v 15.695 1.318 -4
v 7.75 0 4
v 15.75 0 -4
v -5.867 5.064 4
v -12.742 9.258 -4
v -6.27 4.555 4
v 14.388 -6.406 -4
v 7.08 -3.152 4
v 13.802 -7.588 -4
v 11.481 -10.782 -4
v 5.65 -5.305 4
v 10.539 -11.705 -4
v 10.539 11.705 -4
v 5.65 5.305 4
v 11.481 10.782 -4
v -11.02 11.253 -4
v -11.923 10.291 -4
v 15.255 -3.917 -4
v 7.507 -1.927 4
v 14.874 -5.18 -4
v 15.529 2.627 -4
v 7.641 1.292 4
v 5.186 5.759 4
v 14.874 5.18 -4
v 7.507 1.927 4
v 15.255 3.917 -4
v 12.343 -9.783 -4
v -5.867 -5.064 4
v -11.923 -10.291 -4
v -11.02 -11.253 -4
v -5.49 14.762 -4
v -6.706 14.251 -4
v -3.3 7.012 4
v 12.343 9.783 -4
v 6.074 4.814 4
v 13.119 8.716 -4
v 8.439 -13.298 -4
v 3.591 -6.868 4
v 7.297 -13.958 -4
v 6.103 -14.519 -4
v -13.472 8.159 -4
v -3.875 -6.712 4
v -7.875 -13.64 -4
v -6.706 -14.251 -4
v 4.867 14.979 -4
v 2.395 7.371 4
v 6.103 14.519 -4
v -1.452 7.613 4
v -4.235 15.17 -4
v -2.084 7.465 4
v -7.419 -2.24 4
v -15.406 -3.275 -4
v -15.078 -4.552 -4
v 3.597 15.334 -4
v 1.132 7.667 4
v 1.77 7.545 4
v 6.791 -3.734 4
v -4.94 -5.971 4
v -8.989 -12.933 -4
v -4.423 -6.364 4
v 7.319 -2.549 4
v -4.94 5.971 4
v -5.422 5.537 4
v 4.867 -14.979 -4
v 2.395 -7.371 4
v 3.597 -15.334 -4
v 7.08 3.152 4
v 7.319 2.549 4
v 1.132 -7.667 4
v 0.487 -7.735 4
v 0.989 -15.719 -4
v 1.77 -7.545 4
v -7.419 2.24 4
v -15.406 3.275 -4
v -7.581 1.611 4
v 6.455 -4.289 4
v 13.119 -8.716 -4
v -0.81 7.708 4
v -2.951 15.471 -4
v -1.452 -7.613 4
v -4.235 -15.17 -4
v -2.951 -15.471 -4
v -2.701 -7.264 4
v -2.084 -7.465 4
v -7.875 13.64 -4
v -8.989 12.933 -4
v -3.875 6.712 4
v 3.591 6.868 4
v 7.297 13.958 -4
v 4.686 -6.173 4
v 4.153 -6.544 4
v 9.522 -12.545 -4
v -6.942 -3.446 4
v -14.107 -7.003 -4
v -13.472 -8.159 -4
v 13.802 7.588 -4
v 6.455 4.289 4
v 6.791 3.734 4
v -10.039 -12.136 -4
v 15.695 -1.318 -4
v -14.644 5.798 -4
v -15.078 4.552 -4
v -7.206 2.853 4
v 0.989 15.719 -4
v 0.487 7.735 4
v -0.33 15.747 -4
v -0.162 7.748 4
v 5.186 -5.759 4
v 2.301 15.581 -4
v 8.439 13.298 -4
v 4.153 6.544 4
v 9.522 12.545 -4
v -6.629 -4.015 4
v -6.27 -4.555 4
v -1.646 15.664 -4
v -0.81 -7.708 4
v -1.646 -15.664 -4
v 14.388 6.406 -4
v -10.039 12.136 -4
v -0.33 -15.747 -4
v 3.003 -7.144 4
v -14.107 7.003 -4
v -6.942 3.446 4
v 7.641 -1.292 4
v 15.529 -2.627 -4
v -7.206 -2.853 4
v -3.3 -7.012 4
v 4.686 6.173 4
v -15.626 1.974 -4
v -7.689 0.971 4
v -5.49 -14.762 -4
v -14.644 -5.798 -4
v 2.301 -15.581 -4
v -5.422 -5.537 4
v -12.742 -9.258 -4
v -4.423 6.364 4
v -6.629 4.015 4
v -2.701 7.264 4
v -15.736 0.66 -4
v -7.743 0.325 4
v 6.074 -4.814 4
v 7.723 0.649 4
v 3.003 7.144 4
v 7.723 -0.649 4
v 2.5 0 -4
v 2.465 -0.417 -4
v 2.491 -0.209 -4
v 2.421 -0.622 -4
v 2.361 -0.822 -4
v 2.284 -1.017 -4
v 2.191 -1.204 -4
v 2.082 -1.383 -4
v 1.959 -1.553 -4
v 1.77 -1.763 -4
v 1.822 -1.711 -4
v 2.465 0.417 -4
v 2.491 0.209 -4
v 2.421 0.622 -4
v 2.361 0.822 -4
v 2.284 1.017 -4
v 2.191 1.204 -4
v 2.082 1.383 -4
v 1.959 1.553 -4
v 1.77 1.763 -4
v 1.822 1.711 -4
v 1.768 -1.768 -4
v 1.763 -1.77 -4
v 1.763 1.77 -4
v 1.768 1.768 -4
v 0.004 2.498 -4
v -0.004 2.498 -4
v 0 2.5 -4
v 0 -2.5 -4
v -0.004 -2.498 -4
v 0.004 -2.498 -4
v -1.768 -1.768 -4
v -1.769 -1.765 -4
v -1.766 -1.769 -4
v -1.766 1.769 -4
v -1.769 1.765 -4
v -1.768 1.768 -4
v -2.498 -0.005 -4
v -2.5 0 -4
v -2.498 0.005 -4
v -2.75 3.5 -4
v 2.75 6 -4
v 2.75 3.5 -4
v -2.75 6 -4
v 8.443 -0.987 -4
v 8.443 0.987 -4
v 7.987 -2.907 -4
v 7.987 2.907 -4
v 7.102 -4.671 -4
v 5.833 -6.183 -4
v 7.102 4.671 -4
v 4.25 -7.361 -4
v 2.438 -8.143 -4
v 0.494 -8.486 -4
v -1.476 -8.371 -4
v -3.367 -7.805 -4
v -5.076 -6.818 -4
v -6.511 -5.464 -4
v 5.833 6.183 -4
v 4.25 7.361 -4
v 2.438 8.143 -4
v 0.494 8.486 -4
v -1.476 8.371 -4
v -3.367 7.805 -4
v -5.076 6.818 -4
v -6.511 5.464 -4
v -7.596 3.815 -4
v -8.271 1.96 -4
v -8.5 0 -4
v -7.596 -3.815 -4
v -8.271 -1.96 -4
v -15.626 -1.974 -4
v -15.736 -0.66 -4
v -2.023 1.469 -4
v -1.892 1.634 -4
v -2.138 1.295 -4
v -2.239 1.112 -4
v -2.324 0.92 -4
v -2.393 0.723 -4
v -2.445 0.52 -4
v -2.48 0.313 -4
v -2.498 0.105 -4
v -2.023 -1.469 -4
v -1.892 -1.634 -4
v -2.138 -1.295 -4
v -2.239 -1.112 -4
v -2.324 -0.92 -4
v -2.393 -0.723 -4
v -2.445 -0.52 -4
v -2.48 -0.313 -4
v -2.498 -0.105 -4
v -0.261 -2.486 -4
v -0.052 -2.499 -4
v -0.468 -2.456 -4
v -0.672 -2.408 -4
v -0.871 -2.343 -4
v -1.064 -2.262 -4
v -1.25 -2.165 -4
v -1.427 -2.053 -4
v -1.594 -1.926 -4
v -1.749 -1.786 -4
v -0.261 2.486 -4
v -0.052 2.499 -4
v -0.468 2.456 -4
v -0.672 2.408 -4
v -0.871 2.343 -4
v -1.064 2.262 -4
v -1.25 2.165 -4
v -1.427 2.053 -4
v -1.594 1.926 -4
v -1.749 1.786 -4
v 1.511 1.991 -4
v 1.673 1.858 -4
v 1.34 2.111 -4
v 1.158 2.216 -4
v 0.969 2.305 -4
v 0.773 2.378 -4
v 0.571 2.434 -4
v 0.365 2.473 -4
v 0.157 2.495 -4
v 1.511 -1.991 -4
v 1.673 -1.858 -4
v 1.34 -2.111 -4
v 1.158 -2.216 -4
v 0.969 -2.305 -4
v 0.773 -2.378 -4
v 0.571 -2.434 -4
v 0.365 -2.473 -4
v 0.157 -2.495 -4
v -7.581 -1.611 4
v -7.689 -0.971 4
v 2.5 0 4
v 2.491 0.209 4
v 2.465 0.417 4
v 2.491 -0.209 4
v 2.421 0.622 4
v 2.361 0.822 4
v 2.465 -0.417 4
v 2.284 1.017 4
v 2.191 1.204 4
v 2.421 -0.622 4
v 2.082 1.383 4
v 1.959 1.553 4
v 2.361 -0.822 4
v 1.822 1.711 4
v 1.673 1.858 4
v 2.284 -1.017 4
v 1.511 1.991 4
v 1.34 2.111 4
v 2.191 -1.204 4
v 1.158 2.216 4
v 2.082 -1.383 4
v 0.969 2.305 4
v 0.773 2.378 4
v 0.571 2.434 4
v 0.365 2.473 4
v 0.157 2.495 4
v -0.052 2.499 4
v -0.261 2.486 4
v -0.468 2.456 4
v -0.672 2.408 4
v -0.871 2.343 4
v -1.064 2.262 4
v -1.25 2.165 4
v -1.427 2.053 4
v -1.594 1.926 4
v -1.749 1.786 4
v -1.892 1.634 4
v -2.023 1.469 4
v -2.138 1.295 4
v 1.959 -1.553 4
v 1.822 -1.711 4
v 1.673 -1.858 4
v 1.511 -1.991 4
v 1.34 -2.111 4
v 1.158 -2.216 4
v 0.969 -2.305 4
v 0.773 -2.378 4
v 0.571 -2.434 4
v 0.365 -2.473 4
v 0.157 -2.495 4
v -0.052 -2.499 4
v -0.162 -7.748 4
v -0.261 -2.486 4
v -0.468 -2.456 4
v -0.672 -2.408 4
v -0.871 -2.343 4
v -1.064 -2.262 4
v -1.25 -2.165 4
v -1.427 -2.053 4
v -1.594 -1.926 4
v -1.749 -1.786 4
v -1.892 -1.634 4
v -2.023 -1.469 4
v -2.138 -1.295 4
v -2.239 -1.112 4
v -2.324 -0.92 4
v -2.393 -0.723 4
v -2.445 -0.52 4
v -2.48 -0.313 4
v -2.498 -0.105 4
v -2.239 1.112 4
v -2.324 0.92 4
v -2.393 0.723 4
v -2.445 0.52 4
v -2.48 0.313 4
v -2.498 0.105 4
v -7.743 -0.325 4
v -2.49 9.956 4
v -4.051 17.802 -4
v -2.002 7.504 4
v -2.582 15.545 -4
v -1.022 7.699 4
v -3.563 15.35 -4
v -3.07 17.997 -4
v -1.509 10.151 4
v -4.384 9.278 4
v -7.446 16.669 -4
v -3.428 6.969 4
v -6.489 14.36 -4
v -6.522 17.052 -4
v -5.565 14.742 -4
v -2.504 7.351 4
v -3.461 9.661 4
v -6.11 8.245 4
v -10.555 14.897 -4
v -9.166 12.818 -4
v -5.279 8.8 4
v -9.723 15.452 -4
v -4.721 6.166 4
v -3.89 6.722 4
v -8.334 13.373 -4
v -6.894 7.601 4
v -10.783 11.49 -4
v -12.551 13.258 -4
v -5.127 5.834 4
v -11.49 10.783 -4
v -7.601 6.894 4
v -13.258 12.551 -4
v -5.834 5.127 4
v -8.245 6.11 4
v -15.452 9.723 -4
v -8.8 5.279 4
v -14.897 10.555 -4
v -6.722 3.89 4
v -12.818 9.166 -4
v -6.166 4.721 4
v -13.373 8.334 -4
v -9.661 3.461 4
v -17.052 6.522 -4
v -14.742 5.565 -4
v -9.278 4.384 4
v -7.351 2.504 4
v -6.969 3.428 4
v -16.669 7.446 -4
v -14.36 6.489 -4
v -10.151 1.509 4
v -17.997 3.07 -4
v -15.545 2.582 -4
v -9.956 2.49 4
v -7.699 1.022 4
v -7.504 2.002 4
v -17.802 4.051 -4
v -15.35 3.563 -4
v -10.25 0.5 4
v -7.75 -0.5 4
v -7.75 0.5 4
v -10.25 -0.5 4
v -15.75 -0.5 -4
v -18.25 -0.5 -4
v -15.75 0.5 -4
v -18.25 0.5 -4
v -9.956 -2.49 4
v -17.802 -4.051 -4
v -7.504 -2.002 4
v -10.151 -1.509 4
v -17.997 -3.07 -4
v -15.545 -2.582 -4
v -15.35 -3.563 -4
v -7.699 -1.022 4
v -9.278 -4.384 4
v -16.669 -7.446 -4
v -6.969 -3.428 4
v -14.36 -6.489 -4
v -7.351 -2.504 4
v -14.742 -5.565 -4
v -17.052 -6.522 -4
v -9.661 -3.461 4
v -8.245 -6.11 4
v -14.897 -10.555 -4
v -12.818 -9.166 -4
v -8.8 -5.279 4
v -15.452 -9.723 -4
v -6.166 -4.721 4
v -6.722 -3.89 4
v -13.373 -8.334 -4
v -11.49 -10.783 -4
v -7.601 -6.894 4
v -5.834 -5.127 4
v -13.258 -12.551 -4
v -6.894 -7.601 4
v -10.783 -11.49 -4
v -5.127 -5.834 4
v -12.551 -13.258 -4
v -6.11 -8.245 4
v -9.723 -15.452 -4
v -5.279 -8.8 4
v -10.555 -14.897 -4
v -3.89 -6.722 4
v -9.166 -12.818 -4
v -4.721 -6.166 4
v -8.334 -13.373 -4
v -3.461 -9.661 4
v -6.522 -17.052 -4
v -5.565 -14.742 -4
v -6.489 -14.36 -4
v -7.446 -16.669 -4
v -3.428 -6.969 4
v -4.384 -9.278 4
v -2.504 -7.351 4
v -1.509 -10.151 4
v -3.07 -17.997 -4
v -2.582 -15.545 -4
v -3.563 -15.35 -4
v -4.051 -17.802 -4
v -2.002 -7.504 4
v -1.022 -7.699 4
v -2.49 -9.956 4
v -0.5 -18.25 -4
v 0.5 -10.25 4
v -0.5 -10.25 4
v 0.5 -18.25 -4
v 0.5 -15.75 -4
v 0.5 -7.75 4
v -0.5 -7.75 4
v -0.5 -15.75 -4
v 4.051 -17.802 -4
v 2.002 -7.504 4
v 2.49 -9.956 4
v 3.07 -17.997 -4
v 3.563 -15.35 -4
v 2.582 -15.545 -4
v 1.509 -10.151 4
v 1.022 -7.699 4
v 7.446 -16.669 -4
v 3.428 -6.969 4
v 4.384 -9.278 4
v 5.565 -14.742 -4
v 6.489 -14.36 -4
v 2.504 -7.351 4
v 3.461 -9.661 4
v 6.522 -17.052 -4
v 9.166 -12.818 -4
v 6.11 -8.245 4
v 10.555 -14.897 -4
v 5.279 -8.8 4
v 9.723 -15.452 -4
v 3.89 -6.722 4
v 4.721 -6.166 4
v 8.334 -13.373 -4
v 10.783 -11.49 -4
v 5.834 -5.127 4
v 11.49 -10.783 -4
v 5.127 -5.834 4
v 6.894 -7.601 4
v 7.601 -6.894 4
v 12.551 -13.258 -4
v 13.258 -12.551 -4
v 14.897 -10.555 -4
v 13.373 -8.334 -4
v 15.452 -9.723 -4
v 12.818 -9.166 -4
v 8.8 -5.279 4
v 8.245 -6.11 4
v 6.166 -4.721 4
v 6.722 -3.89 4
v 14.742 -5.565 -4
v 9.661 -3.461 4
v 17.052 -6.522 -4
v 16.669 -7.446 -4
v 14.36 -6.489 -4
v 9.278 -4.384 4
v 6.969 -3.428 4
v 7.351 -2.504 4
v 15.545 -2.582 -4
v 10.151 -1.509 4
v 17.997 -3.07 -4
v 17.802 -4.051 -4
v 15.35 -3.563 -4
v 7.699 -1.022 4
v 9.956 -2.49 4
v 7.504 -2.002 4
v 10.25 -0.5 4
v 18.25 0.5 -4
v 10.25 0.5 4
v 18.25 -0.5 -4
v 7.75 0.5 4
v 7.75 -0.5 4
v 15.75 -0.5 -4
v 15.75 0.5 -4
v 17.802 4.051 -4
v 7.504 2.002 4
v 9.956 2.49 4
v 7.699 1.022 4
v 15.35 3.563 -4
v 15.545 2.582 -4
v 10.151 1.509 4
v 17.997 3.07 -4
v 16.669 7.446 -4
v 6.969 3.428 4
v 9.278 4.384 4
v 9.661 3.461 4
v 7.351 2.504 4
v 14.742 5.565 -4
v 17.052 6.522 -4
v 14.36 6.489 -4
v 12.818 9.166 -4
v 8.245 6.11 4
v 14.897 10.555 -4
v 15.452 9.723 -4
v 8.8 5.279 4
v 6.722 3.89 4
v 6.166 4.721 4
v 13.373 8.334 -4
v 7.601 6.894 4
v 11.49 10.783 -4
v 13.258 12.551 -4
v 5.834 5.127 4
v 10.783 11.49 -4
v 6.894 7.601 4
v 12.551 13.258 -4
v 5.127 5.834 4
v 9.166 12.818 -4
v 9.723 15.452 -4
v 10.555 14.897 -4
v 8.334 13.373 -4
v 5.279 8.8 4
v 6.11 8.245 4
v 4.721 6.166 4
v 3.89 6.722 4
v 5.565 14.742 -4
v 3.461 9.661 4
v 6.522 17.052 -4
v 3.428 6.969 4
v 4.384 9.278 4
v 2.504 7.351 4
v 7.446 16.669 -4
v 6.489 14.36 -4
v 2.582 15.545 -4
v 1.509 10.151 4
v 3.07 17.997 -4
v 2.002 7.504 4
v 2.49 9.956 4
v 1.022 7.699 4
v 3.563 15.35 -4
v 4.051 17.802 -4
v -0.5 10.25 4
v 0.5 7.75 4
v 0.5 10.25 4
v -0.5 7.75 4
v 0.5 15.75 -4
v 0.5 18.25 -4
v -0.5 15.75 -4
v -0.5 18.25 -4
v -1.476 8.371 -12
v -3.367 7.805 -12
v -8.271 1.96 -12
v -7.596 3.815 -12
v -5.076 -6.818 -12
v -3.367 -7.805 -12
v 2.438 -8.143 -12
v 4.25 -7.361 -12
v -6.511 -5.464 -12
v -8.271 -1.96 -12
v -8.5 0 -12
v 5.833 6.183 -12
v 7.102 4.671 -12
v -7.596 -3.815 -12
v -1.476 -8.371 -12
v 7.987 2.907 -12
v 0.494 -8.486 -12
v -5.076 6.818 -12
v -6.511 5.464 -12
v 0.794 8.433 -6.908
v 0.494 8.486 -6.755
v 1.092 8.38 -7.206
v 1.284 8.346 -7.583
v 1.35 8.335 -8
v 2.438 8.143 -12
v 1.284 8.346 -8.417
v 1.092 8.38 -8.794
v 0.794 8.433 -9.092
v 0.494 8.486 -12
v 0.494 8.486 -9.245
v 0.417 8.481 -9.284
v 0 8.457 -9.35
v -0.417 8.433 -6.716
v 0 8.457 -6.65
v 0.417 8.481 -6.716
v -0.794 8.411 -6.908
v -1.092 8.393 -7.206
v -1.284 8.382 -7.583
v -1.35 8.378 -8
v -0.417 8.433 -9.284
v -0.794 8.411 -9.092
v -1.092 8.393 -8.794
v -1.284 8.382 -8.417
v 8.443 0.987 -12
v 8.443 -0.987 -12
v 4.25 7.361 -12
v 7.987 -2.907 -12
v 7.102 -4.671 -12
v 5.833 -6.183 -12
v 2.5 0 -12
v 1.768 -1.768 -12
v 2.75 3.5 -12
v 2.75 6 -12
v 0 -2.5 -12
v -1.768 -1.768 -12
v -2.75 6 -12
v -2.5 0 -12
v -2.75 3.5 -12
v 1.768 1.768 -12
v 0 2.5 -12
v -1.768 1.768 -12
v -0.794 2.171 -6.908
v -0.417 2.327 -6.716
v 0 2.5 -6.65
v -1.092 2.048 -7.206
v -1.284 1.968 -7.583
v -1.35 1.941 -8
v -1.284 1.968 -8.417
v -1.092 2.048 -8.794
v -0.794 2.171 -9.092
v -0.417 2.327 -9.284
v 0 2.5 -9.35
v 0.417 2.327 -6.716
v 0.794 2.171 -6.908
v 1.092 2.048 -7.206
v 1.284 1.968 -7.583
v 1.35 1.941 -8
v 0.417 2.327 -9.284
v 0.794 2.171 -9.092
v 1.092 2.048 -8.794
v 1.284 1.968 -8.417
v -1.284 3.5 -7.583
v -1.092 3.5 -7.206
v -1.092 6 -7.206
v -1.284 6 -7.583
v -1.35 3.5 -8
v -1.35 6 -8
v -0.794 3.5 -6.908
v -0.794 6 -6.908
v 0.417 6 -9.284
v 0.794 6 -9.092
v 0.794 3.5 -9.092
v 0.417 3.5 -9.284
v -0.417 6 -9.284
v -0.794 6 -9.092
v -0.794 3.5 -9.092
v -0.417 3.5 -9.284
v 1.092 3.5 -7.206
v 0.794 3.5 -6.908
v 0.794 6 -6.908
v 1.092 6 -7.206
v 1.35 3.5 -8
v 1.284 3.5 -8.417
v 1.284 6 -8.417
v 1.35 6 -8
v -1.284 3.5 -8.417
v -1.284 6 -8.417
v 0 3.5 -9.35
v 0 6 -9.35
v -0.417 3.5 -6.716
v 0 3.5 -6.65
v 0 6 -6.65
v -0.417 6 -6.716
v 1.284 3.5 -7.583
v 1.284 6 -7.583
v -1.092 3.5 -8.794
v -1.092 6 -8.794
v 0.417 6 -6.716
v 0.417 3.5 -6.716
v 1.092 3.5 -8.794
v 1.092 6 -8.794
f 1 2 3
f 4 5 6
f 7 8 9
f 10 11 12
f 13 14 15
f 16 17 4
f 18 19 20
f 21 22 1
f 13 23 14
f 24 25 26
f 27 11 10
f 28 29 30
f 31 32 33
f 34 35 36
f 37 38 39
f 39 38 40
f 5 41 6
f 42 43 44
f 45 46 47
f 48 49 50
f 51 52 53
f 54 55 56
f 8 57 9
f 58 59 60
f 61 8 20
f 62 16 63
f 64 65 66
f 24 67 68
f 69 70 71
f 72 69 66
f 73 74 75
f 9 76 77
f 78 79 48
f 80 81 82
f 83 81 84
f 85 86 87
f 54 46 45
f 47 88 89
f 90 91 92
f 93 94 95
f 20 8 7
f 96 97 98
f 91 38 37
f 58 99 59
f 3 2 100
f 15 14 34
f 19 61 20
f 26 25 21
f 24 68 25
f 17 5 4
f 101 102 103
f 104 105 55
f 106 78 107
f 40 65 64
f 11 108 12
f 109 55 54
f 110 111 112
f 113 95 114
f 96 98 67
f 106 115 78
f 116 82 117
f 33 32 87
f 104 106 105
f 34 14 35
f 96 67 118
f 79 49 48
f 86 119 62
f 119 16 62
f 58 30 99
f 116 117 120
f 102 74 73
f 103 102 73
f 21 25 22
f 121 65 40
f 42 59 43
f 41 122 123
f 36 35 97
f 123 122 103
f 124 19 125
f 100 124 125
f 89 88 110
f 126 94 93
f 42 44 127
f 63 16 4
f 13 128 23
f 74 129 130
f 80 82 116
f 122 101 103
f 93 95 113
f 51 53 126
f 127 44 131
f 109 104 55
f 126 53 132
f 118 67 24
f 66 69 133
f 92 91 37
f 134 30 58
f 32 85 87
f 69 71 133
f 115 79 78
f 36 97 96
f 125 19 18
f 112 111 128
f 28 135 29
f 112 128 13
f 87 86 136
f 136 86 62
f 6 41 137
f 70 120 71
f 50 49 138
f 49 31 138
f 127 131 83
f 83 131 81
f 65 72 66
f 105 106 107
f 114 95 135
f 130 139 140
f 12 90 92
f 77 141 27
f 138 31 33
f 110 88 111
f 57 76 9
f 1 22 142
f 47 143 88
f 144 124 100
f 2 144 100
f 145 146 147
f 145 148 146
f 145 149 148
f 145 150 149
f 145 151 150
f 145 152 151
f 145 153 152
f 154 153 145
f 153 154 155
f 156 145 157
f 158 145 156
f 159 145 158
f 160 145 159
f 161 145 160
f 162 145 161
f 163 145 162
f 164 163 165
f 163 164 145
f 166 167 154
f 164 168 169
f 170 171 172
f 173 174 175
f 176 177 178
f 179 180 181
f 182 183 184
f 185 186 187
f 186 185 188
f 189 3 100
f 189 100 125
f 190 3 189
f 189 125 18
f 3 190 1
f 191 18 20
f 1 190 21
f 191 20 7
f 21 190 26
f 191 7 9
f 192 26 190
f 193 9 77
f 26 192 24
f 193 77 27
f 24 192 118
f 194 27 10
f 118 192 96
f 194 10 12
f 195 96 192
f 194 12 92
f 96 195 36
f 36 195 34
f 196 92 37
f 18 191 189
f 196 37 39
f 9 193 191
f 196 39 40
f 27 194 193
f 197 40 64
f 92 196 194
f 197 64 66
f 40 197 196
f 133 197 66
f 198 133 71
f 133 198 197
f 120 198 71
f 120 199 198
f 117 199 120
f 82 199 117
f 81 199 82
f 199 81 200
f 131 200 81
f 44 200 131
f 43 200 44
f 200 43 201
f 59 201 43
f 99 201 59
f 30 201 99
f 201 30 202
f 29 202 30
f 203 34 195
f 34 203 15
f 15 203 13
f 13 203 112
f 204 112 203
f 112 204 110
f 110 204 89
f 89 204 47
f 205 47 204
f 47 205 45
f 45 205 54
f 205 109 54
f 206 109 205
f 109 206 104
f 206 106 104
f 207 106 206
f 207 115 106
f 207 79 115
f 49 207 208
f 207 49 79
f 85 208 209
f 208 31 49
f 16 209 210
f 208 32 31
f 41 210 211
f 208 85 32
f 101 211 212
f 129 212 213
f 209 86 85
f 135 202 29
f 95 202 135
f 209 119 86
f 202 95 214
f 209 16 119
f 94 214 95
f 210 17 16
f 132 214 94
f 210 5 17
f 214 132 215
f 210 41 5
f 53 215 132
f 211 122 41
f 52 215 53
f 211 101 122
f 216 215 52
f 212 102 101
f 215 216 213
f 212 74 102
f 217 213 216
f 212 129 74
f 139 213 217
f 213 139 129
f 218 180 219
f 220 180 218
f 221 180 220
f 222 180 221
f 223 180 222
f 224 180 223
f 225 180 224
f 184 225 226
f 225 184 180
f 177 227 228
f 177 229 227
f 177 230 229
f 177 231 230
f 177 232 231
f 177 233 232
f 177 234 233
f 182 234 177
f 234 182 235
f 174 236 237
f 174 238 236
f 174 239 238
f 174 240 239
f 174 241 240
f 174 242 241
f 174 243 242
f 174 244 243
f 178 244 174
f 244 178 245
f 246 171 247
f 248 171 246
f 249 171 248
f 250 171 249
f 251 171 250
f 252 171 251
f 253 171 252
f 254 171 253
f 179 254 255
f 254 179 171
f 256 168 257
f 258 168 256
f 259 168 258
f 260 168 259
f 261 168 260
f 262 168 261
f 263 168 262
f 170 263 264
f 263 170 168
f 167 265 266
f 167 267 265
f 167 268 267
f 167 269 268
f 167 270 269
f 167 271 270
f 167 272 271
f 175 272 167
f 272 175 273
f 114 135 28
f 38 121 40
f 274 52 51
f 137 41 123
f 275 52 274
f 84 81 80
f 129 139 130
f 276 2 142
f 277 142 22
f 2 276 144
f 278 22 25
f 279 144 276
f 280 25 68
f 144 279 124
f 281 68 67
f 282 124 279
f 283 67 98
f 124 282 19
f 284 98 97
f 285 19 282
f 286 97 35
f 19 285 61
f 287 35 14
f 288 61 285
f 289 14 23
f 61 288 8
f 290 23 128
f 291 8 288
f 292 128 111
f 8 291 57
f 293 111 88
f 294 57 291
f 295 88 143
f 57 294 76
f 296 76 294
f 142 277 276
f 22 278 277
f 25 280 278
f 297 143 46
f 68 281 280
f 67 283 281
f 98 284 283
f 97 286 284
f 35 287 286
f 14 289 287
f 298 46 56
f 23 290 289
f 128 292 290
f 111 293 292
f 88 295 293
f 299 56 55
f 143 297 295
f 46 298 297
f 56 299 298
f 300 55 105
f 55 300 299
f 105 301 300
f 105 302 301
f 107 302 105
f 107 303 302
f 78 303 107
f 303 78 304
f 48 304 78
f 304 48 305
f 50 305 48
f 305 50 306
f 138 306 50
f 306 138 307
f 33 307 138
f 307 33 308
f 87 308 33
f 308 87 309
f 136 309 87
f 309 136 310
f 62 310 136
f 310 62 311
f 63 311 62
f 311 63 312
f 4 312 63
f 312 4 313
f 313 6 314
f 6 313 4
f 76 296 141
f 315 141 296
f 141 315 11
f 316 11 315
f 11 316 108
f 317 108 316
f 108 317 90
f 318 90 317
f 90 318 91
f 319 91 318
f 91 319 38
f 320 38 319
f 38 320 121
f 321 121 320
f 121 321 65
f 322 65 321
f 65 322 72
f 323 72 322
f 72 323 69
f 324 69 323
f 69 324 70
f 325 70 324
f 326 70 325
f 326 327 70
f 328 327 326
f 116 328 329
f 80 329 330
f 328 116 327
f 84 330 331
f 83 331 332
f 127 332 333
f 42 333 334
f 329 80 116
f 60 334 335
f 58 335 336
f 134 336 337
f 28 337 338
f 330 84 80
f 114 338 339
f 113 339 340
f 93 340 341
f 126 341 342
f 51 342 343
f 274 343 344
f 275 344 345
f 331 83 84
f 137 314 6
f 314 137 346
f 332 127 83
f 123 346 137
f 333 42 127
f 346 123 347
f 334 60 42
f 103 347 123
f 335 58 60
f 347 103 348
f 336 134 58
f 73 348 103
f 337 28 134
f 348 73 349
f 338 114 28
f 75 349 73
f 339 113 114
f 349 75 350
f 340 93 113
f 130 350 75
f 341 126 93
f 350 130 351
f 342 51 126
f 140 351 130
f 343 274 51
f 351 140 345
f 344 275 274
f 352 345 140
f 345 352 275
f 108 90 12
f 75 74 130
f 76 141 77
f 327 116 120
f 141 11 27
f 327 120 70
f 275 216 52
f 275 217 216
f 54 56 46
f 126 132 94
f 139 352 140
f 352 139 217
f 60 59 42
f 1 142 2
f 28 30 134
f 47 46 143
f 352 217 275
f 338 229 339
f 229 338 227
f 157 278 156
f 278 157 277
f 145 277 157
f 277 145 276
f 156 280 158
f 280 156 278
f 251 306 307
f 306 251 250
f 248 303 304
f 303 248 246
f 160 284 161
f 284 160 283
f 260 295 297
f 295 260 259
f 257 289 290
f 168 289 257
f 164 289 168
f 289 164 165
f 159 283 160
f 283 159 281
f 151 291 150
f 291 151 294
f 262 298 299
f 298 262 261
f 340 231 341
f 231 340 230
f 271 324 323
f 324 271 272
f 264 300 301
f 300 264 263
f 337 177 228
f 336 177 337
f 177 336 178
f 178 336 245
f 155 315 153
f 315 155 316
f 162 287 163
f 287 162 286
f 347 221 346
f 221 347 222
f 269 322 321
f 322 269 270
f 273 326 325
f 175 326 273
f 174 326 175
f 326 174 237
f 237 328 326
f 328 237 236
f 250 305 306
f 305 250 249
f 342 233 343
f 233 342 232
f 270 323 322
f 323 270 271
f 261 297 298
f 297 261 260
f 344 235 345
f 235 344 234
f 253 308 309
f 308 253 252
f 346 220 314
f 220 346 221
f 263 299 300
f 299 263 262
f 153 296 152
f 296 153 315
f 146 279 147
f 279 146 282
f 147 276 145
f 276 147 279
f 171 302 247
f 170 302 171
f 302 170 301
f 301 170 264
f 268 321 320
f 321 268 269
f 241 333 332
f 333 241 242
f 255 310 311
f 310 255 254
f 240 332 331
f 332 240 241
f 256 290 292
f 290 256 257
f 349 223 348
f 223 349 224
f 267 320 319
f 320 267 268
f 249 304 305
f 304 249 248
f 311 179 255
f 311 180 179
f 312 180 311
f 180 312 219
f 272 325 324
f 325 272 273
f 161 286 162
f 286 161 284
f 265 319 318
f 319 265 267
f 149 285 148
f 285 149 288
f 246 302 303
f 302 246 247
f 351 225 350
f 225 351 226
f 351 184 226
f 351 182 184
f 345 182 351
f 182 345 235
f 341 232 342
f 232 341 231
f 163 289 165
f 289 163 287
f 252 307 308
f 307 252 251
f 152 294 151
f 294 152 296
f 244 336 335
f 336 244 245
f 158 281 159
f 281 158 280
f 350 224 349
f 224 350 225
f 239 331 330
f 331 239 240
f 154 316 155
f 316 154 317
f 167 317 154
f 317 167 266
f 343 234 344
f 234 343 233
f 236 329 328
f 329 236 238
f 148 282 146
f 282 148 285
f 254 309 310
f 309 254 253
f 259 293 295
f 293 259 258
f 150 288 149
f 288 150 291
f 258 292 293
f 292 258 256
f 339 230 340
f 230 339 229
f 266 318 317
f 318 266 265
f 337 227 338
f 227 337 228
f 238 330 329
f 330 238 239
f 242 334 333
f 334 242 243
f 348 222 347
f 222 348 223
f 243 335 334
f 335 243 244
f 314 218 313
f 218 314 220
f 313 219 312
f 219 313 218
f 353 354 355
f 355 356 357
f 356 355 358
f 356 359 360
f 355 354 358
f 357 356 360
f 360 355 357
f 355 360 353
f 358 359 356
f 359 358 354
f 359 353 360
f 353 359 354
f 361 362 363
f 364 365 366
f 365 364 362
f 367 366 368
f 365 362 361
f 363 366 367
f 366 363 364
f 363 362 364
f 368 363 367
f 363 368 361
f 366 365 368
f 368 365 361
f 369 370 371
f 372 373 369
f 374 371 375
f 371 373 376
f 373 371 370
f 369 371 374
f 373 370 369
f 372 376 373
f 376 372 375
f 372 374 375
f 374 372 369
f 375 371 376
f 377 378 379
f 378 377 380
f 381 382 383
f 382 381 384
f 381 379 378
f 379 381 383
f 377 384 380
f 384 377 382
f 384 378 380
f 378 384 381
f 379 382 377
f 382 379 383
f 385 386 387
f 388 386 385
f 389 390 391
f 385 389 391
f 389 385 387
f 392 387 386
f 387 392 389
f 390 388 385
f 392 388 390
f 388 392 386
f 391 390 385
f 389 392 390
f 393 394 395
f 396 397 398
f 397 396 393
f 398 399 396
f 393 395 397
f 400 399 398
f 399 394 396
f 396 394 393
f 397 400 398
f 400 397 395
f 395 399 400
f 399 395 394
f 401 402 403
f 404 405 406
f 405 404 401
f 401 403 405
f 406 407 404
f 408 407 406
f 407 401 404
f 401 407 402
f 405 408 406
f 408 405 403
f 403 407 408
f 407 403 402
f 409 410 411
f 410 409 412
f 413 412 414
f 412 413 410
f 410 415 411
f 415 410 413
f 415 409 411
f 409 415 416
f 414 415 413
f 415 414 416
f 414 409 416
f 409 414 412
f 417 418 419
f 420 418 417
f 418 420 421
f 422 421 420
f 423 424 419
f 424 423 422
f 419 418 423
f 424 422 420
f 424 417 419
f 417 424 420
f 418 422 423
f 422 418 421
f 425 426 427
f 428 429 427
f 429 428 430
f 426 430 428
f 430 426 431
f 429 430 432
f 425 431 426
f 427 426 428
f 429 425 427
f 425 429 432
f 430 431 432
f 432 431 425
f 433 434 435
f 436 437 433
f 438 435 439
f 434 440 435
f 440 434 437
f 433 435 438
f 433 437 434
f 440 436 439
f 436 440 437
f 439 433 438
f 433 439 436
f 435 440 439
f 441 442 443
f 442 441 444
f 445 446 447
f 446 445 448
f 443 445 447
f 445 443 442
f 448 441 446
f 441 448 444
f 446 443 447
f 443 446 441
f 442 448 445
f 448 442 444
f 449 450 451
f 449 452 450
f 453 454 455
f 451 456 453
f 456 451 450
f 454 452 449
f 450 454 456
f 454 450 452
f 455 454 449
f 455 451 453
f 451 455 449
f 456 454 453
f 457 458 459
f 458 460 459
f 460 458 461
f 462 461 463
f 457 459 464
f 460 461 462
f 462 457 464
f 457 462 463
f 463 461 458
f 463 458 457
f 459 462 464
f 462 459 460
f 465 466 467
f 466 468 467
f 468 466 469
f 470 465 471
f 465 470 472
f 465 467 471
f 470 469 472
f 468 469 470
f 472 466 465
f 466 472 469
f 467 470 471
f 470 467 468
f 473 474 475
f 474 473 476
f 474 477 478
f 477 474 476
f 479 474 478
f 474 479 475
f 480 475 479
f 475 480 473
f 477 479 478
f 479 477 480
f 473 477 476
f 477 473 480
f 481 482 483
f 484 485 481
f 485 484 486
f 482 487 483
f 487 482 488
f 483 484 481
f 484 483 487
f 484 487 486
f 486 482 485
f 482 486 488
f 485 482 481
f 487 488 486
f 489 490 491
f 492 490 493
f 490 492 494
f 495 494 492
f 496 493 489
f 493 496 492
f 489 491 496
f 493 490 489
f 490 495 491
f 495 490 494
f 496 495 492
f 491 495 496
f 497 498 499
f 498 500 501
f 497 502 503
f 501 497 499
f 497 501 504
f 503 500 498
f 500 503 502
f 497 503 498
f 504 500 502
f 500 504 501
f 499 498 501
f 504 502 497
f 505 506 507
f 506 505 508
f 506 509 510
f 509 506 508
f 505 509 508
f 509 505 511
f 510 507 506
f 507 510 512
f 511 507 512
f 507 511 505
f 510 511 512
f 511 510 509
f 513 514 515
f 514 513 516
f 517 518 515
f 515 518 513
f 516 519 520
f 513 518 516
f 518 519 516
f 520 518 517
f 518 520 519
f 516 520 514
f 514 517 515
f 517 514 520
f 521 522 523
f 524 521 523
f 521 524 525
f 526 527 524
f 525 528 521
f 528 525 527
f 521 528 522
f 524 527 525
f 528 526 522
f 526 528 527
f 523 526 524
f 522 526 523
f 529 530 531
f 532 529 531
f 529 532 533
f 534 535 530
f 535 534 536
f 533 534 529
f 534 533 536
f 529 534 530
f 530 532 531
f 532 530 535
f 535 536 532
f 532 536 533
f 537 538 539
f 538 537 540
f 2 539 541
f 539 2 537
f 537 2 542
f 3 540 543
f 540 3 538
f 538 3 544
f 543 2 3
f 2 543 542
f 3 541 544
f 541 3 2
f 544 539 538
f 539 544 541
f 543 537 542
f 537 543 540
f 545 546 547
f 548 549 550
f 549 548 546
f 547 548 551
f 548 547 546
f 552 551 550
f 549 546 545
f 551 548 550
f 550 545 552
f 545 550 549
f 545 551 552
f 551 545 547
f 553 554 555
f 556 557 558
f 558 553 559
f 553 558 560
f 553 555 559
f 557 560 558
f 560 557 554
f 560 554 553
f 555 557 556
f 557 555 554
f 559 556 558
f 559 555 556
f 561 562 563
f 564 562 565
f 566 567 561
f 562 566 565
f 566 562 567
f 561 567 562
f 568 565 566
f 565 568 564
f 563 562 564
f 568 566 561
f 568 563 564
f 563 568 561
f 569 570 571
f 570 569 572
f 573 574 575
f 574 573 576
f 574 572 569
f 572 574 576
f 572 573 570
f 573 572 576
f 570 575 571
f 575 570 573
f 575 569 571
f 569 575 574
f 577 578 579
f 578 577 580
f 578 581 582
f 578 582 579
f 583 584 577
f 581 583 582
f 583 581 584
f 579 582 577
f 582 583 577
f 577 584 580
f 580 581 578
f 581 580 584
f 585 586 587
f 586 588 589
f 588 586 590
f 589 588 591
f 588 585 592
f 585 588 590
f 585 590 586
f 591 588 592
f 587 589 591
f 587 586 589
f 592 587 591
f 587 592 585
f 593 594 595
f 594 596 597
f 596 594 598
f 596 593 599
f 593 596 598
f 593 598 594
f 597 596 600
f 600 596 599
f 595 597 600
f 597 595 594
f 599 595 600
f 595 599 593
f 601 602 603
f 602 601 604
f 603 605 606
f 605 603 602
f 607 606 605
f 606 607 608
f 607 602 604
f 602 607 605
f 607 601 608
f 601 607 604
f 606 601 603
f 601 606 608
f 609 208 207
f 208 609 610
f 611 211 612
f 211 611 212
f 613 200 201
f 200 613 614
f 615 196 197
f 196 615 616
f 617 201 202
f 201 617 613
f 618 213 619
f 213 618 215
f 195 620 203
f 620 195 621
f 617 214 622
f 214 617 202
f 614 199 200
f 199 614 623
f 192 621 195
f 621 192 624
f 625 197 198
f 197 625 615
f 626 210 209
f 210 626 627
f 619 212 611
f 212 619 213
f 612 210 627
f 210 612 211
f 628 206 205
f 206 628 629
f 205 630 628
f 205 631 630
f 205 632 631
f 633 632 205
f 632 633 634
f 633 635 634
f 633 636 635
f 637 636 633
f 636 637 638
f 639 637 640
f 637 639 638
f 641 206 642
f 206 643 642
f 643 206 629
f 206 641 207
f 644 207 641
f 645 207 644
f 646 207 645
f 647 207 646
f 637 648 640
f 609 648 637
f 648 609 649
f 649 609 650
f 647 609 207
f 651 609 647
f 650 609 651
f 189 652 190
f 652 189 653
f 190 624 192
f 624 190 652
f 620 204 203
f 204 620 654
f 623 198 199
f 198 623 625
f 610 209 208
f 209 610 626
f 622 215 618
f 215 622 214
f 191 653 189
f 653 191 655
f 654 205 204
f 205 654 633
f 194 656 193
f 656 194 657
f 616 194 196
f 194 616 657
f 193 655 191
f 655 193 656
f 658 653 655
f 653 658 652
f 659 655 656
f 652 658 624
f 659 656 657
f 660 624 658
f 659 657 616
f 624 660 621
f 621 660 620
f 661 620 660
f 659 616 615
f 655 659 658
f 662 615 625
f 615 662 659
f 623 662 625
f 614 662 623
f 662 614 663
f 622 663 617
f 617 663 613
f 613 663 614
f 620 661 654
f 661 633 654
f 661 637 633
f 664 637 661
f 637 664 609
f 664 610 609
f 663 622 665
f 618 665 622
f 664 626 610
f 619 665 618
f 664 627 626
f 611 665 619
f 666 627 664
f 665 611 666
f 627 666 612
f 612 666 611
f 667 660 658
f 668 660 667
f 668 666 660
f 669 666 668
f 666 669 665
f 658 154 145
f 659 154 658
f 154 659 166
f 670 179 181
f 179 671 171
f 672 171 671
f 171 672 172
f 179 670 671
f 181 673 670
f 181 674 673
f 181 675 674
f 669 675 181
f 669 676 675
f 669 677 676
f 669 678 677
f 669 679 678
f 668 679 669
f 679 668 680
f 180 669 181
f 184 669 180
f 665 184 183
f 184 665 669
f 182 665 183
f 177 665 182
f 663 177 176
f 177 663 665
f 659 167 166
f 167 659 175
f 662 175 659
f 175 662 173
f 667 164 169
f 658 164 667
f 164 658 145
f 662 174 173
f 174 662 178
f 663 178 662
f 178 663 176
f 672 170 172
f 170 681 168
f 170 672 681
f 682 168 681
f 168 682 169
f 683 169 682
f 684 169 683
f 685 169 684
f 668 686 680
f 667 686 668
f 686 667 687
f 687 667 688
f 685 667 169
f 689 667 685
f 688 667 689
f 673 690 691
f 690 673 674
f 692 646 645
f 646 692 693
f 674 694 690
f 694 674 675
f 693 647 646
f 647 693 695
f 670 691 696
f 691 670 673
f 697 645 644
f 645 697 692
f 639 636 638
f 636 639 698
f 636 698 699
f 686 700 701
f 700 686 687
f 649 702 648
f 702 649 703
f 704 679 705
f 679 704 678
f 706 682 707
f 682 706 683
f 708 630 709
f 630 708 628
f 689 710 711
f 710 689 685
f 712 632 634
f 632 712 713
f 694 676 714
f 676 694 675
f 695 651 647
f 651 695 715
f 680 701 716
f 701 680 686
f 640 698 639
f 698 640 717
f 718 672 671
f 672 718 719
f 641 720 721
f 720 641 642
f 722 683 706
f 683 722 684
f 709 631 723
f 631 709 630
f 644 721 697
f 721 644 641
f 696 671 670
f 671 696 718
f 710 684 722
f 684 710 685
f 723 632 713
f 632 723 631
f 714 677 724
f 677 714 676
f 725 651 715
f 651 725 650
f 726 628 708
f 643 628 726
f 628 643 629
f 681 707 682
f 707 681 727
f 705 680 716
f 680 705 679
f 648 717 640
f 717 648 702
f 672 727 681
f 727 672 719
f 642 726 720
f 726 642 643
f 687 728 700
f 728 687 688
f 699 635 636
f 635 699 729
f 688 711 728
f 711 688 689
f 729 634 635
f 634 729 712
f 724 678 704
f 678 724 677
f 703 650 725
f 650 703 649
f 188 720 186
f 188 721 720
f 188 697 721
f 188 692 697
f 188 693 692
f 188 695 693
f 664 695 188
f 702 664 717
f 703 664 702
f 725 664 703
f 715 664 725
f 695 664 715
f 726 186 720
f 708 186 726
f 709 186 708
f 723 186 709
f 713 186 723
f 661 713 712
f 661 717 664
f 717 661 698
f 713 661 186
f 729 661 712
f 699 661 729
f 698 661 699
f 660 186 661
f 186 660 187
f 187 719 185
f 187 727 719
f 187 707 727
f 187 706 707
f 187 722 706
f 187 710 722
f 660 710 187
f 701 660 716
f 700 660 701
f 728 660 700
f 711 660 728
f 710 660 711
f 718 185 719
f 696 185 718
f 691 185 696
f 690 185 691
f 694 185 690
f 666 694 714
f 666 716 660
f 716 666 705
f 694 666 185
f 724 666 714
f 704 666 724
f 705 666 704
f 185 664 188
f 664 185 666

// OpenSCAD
// Parametric Gears
// by wayland
// http://www.thingiverse.com/thing:2085

// General Parameters

basediameter = 32;   // pitch diameter of widest part 
depth = 8;           // depth of the gear
holediam = 5;        // diameter of center hole
teethnumber = 32;    // number of teeth
toothwidth = 1;      // width of teeth
addendum = 2;      // addendum
dedendum = 1/2;      // dedendum
toothshape = 0;   // how much of the tooth is triangular			                // for no triangles, make it 0
				 // otherwise it should be a fraction
centercircles = 0;   // number of center circles
				 // if you don't want any, put 0
				 // they are radially centered
centercircdiam = 3;  // diameter of center circles


//Bevel Parameters

degrees = 45;        // base angle of the gear
				 // 90 for a regular spur gear
				 // negative numbers are possible
extendbevel = 0;     // creates a spur top for bevel gears 
				 // only works if rbasediameter = 0
				 // 1 is on, 0 is off
bdepth = 3;          // thickness of extended bevel 
basedepth = 2;       // depth of the flat base at the bottom
				 // to turn it off, just make it 0

//Rome Gear Parameters:

rbasediameter = 0;   // pitch diameter of widest part
				 // to turn Rome gear off, make it 0
rdegrees = 90;       // base angle
rdepth = 2;          // thickness
rteeth = 10;         // number of teeth
rtwidth = 1;         // tooth width
raddendum = 1/4;     // addendum
rdedendum = 1/4;     // dedendum
rtoothshape = 1;

//Mounting:

mountingwall = 2;
nuthole = 5.5;
nutholedepth = 2.5;

/*---------------------------------------------------------*/

// Modules

module gear (diam1, thick, angle, ded, add, twidth, tnumber, toothfraction)
 {

	//Trig to find top diameter:

	triangbase = thick / tan(angle);
	topdiameter =  (diam1 - 2 * triangbase) - ded;

	//Miscellaneous variables:

	bottomdiameter = diam1 - ded;
	howmuchistri = toothfraction * (add + ded);
	toothlength = (add + ded) - howmuchistri; 
	xthick = twidth/2;

	union() {

		difference () {

			cylinder(h = thick, r1 = bottomdiameter/2, r2 = topdiameter/2, $fn = 75, center = true);
			cylinder(h = 2*thick, r = holediam / 2, center = true, $fn = 75);
			centershape(thick, topdiameter);

			}

		}

		for ( i = [1:tnumber] ) {

			rotate( i*360/tnumber, [0, 0, 1])
			translate ([0, 0, thick / -2])

			geartooth (bottomdiameter, topdiameter, xthick, toothlength, thick, howmuchistri);

		}

}

module centershape (thick, diam) {

if (centercircles > 0) {

	for ( f = [1:centercircles] ) {

		rotate( f*360/centercircles, [0, 0, 1])
		translate ([diam/4, 0, 0 ])
		cylinder ( h = 2*thick, r = centercircdiam/2, $fn = 75, center = true);

	}

}

}

module geartooth (diam1, diam2, xthickness, tlength, zthick, point){

// Sorry... polyhedra are so messy in openSCAD
// In case you're wondering, the following polyhedra are one
// tooth. The first is rectangular, the second has triangles.

	if (point == 0) {

	polyhedron ( points = 
[[-xthickness, diam2/2, zthick], [-xthickness, tlength + diam2/2, zthick], [-xthickness, tlength + diam1/2, 0], [-xthickness, diam1/2, 0], [xthickness, diam2/2, zthick], [xthickness, tlength + diam2/2, zthick], [xthickness, tlength + diam1/2, 0], [xthickness, diam1/2, 0]
], triangles = [[0,2,1], [0,3,2],[3,0,4],[1,2,5],[0,5,4],[0,1,5],[5,2,6],[7,3,4],[4,5,6],[4,6,7],[6,2,7],[2,3,7]]);

	}

	if (point > 0 ) {

		polyhedron ( points = 
[[-xthickness, diam2/2, zthick], [-xthickness, tlength + diam2/2, zthick], [-xthickness, tlength + diam1/2, 0], [-xthickness, diam1/2, 0], [xthickness, diam2/2, zthick], [xthickness, tlength + diam2/2, zthick], [xthickness, tlength + diam1/2, 0], [xthickness, diam1/2, 0],[0, tlength + diam2/2 + point, zthick],[0, tlength + diam1/2 + point, 0]
], triangles = [[0,2,1], [0,3,2],[3,0,4],[1,2,8],[0,5,4],[0,1,5],[5,9,6],[7,3,4],[4,5,6],[4,6,7],[6,2,7],[2,3,7],[1,8,5],[2,6,9],[2,9,8],[5,8,9],]);

	}

}
/*---------------------------------------------------------*/
module bevel_gear () {
	gear (basediameter, depth, degrees, dedendum, addendum, toothwidth, teethnumber, toothshape);
	if (rbasediameter > 0) {
		translate ([0, 0, depth/2 + rdepth/2])
		gear (rbasediameter, rdepth, rdegrees, rdedendum, raddendum, rtwidth, rteeth, rtoothshape);
	}

//More trig to find top diameter:

	triangbase = depth / tan(degrees);
	topdiameter =  (basediameter - 2 * triangbase);

	if (rbasediameter == 0 && extendbevel == 1) {
		translate ([0, 0, depth/2 + bdepth/2])
		gear (topdiameter, bdepth, 90, dedendum, addendum, toothwidth, teethnumber);
	}

	translate([0, 0, -(depth / 2)])
		rotate([0, 180, 0])
			difference() {
				cylinder(d = holediam + (mountingwall * 6), h = depth);
				translate([0, 0, -1]) {
					cylinder(d = holediam, h = depth + 2, $f = 20);
				}
				rotate([-90, 0, 0]) {
					translate([0, -(depth / 2), 0])
						cylinder(d = 2.7, h = 100, $fn = 20);
				}
				rotate([0, 90, 90]) {
					translate([-9, -(nuthole / 2), holediam - (nutholedepth - 1)])
						cube([depth + 1, nuthole, nutholedepth]);
				}
			}
}

bevel_gear();
